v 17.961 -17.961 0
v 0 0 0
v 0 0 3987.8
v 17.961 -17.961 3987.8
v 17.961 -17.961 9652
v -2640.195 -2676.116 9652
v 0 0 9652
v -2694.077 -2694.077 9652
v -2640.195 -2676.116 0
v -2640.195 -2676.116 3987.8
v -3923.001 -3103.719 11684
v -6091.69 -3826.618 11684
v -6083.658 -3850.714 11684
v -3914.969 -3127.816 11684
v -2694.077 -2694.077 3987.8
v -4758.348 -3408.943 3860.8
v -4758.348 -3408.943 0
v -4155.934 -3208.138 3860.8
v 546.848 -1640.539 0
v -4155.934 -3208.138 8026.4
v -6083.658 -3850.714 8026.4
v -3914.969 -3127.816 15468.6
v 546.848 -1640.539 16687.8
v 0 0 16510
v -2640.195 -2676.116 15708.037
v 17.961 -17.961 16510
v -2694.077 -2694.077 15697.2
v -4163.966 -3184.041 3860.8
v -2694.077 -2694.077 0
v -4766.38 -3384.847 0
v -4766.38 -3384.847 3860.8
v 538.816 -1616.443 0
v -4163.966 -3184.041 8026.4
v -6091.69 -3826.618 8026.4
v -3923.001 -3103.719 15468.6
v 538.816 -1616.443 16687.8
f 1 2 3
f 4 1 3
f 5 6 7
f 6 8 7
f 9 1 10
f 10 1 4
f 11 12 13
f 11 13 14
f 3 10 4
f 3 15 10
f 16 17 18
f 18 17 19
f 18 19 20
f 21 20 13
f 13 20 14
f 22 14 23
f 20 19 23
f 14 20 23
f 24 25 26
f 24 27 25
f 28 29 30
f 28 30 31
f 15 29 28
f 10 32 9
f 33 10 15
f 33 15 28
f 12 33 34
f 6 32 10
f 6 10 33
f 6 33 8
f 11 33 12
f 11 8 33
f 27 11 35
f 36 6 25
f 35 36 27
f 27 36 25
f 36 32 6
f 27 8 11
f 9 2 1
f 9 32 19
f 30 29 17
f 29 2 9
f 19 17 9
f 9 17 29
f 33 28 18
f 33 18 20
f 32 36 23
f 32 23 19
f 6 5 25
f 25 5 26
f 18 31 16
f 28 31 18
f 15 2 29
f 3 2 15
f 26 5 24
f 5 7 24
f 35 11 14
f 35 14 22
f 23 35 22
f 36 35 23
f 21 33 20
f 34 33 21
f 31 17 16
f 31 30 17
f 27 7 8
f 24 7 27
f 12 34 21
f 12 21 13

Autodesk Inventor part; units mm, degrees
ref_plane "YZ Plane" through (0, 0, 0) normal (1, 0, 0) x (0, 1, 0)
ref_plane "Work Plane3" through (0, 0, 0) normal (-0.7071068, 0.7071068, 0) x (0, 0, 1)
sketch "Sketch9" plane through (0, 0, 0) normal (-0.7071068, 0.7071068, 0) x (0, 0, 1)
  line L0 (0, 0) -> (0, -3810)
  line L1 (0, -3810) -> (3987.8, -3810)
  line L2 (3987.8, -3810) -> (3987.8, 0)
  line L3 (0, 0) -> (3987.8, 0)
  line L4 (3987.8, -3810) -> (9652, -3810) construction
  line L5 (9652, -3810) -> (9652, 0)
  line L6 (9652, 0) -> (16510, 0)
  line L7 (15697.2, -3810) -> (9652, -3810)
  line L8 (15697.2, -3810) -> (16510, 0)
  dimension "d39" = 3810
  dimension "d40" = 3987.8
  dimension "d53" = 5664.2
  dimension "d54" = 6045.2
  dimension "d55" = 6858
ref_plane "4-12pictchWorkPlane" through (-2694.0768, -2694.0768, 0) normal (-0.3162286, 0.948683, 0) x (0, 0, 1)
sketch "Sketch10" plane through (-2694.0768, -2694.0768, 0) normal (-0.3162286, 0.948683, 0) x (0, 0, 1)
  line L0 (0, 0) -> (0, -2184.4)
  line L1 (0, -2184.4) -> (3860.8, -2184.4)
  line L2 (3860.8, -2184.4) -> (3860.8, -1549.4)
  line L3 (3860.8, -1549.4) -> (8026.4, -1549.4)
  line L4 (8026.4, -1549.4) -> (8026.4, -3581.4)
  line L5 (8026.4, -3581.4) -> (11684, -3581.4)
  line L6 (11684, -3581.4) -> (11684, -1295.4)
  line L7 (11684, -1295.4) -> (15468.6, -1295.4)
  line L8 (15468.6, -1295.4) -> (15468.6, 3407.7691) construction
  line L9 (17156.3434, 3407.7691) -> (0, 3407.7691)
  line L10 (15468.6, 3407.7691) -> (16687.8, 3407.7691) construction
  line L11 (15468.6, -1295.4) -> (16687.8, 3407.7691)
  line L12 (0, 0) -> (15804.4058, 0)
  line L13 (0, 0) -> (0, 3407.7691)
  line L14 (0, 3407.7691) -> (16687.8, 3407.7691)
  dimension "d42" = 2184.4
  dimension "d43" = 3860.8
  dimension "d44" = 635
  dimension "d45" = 4165.6
  dimension "d46" = 2032
  dimension "d47" = 3657.6
  dimension "d48" = 2286
  dimension "d49" = 3784.6
  dimension "d50" = 1219.2
  dimension "d58" = 90
extrude "Extrusion8" add sketch "Sketch10" against normal blind 25.4
extrude "Extrusion9" add sketch "Sketch9" against normal blind 25.4
equation "\"pitch_4_12\" = 18.435deg"
equation "\"pitch_12_12\" = 45deg"
equation "\"d41\" = pitch_4_12"
properties part number "mainPartHouseRoof"
